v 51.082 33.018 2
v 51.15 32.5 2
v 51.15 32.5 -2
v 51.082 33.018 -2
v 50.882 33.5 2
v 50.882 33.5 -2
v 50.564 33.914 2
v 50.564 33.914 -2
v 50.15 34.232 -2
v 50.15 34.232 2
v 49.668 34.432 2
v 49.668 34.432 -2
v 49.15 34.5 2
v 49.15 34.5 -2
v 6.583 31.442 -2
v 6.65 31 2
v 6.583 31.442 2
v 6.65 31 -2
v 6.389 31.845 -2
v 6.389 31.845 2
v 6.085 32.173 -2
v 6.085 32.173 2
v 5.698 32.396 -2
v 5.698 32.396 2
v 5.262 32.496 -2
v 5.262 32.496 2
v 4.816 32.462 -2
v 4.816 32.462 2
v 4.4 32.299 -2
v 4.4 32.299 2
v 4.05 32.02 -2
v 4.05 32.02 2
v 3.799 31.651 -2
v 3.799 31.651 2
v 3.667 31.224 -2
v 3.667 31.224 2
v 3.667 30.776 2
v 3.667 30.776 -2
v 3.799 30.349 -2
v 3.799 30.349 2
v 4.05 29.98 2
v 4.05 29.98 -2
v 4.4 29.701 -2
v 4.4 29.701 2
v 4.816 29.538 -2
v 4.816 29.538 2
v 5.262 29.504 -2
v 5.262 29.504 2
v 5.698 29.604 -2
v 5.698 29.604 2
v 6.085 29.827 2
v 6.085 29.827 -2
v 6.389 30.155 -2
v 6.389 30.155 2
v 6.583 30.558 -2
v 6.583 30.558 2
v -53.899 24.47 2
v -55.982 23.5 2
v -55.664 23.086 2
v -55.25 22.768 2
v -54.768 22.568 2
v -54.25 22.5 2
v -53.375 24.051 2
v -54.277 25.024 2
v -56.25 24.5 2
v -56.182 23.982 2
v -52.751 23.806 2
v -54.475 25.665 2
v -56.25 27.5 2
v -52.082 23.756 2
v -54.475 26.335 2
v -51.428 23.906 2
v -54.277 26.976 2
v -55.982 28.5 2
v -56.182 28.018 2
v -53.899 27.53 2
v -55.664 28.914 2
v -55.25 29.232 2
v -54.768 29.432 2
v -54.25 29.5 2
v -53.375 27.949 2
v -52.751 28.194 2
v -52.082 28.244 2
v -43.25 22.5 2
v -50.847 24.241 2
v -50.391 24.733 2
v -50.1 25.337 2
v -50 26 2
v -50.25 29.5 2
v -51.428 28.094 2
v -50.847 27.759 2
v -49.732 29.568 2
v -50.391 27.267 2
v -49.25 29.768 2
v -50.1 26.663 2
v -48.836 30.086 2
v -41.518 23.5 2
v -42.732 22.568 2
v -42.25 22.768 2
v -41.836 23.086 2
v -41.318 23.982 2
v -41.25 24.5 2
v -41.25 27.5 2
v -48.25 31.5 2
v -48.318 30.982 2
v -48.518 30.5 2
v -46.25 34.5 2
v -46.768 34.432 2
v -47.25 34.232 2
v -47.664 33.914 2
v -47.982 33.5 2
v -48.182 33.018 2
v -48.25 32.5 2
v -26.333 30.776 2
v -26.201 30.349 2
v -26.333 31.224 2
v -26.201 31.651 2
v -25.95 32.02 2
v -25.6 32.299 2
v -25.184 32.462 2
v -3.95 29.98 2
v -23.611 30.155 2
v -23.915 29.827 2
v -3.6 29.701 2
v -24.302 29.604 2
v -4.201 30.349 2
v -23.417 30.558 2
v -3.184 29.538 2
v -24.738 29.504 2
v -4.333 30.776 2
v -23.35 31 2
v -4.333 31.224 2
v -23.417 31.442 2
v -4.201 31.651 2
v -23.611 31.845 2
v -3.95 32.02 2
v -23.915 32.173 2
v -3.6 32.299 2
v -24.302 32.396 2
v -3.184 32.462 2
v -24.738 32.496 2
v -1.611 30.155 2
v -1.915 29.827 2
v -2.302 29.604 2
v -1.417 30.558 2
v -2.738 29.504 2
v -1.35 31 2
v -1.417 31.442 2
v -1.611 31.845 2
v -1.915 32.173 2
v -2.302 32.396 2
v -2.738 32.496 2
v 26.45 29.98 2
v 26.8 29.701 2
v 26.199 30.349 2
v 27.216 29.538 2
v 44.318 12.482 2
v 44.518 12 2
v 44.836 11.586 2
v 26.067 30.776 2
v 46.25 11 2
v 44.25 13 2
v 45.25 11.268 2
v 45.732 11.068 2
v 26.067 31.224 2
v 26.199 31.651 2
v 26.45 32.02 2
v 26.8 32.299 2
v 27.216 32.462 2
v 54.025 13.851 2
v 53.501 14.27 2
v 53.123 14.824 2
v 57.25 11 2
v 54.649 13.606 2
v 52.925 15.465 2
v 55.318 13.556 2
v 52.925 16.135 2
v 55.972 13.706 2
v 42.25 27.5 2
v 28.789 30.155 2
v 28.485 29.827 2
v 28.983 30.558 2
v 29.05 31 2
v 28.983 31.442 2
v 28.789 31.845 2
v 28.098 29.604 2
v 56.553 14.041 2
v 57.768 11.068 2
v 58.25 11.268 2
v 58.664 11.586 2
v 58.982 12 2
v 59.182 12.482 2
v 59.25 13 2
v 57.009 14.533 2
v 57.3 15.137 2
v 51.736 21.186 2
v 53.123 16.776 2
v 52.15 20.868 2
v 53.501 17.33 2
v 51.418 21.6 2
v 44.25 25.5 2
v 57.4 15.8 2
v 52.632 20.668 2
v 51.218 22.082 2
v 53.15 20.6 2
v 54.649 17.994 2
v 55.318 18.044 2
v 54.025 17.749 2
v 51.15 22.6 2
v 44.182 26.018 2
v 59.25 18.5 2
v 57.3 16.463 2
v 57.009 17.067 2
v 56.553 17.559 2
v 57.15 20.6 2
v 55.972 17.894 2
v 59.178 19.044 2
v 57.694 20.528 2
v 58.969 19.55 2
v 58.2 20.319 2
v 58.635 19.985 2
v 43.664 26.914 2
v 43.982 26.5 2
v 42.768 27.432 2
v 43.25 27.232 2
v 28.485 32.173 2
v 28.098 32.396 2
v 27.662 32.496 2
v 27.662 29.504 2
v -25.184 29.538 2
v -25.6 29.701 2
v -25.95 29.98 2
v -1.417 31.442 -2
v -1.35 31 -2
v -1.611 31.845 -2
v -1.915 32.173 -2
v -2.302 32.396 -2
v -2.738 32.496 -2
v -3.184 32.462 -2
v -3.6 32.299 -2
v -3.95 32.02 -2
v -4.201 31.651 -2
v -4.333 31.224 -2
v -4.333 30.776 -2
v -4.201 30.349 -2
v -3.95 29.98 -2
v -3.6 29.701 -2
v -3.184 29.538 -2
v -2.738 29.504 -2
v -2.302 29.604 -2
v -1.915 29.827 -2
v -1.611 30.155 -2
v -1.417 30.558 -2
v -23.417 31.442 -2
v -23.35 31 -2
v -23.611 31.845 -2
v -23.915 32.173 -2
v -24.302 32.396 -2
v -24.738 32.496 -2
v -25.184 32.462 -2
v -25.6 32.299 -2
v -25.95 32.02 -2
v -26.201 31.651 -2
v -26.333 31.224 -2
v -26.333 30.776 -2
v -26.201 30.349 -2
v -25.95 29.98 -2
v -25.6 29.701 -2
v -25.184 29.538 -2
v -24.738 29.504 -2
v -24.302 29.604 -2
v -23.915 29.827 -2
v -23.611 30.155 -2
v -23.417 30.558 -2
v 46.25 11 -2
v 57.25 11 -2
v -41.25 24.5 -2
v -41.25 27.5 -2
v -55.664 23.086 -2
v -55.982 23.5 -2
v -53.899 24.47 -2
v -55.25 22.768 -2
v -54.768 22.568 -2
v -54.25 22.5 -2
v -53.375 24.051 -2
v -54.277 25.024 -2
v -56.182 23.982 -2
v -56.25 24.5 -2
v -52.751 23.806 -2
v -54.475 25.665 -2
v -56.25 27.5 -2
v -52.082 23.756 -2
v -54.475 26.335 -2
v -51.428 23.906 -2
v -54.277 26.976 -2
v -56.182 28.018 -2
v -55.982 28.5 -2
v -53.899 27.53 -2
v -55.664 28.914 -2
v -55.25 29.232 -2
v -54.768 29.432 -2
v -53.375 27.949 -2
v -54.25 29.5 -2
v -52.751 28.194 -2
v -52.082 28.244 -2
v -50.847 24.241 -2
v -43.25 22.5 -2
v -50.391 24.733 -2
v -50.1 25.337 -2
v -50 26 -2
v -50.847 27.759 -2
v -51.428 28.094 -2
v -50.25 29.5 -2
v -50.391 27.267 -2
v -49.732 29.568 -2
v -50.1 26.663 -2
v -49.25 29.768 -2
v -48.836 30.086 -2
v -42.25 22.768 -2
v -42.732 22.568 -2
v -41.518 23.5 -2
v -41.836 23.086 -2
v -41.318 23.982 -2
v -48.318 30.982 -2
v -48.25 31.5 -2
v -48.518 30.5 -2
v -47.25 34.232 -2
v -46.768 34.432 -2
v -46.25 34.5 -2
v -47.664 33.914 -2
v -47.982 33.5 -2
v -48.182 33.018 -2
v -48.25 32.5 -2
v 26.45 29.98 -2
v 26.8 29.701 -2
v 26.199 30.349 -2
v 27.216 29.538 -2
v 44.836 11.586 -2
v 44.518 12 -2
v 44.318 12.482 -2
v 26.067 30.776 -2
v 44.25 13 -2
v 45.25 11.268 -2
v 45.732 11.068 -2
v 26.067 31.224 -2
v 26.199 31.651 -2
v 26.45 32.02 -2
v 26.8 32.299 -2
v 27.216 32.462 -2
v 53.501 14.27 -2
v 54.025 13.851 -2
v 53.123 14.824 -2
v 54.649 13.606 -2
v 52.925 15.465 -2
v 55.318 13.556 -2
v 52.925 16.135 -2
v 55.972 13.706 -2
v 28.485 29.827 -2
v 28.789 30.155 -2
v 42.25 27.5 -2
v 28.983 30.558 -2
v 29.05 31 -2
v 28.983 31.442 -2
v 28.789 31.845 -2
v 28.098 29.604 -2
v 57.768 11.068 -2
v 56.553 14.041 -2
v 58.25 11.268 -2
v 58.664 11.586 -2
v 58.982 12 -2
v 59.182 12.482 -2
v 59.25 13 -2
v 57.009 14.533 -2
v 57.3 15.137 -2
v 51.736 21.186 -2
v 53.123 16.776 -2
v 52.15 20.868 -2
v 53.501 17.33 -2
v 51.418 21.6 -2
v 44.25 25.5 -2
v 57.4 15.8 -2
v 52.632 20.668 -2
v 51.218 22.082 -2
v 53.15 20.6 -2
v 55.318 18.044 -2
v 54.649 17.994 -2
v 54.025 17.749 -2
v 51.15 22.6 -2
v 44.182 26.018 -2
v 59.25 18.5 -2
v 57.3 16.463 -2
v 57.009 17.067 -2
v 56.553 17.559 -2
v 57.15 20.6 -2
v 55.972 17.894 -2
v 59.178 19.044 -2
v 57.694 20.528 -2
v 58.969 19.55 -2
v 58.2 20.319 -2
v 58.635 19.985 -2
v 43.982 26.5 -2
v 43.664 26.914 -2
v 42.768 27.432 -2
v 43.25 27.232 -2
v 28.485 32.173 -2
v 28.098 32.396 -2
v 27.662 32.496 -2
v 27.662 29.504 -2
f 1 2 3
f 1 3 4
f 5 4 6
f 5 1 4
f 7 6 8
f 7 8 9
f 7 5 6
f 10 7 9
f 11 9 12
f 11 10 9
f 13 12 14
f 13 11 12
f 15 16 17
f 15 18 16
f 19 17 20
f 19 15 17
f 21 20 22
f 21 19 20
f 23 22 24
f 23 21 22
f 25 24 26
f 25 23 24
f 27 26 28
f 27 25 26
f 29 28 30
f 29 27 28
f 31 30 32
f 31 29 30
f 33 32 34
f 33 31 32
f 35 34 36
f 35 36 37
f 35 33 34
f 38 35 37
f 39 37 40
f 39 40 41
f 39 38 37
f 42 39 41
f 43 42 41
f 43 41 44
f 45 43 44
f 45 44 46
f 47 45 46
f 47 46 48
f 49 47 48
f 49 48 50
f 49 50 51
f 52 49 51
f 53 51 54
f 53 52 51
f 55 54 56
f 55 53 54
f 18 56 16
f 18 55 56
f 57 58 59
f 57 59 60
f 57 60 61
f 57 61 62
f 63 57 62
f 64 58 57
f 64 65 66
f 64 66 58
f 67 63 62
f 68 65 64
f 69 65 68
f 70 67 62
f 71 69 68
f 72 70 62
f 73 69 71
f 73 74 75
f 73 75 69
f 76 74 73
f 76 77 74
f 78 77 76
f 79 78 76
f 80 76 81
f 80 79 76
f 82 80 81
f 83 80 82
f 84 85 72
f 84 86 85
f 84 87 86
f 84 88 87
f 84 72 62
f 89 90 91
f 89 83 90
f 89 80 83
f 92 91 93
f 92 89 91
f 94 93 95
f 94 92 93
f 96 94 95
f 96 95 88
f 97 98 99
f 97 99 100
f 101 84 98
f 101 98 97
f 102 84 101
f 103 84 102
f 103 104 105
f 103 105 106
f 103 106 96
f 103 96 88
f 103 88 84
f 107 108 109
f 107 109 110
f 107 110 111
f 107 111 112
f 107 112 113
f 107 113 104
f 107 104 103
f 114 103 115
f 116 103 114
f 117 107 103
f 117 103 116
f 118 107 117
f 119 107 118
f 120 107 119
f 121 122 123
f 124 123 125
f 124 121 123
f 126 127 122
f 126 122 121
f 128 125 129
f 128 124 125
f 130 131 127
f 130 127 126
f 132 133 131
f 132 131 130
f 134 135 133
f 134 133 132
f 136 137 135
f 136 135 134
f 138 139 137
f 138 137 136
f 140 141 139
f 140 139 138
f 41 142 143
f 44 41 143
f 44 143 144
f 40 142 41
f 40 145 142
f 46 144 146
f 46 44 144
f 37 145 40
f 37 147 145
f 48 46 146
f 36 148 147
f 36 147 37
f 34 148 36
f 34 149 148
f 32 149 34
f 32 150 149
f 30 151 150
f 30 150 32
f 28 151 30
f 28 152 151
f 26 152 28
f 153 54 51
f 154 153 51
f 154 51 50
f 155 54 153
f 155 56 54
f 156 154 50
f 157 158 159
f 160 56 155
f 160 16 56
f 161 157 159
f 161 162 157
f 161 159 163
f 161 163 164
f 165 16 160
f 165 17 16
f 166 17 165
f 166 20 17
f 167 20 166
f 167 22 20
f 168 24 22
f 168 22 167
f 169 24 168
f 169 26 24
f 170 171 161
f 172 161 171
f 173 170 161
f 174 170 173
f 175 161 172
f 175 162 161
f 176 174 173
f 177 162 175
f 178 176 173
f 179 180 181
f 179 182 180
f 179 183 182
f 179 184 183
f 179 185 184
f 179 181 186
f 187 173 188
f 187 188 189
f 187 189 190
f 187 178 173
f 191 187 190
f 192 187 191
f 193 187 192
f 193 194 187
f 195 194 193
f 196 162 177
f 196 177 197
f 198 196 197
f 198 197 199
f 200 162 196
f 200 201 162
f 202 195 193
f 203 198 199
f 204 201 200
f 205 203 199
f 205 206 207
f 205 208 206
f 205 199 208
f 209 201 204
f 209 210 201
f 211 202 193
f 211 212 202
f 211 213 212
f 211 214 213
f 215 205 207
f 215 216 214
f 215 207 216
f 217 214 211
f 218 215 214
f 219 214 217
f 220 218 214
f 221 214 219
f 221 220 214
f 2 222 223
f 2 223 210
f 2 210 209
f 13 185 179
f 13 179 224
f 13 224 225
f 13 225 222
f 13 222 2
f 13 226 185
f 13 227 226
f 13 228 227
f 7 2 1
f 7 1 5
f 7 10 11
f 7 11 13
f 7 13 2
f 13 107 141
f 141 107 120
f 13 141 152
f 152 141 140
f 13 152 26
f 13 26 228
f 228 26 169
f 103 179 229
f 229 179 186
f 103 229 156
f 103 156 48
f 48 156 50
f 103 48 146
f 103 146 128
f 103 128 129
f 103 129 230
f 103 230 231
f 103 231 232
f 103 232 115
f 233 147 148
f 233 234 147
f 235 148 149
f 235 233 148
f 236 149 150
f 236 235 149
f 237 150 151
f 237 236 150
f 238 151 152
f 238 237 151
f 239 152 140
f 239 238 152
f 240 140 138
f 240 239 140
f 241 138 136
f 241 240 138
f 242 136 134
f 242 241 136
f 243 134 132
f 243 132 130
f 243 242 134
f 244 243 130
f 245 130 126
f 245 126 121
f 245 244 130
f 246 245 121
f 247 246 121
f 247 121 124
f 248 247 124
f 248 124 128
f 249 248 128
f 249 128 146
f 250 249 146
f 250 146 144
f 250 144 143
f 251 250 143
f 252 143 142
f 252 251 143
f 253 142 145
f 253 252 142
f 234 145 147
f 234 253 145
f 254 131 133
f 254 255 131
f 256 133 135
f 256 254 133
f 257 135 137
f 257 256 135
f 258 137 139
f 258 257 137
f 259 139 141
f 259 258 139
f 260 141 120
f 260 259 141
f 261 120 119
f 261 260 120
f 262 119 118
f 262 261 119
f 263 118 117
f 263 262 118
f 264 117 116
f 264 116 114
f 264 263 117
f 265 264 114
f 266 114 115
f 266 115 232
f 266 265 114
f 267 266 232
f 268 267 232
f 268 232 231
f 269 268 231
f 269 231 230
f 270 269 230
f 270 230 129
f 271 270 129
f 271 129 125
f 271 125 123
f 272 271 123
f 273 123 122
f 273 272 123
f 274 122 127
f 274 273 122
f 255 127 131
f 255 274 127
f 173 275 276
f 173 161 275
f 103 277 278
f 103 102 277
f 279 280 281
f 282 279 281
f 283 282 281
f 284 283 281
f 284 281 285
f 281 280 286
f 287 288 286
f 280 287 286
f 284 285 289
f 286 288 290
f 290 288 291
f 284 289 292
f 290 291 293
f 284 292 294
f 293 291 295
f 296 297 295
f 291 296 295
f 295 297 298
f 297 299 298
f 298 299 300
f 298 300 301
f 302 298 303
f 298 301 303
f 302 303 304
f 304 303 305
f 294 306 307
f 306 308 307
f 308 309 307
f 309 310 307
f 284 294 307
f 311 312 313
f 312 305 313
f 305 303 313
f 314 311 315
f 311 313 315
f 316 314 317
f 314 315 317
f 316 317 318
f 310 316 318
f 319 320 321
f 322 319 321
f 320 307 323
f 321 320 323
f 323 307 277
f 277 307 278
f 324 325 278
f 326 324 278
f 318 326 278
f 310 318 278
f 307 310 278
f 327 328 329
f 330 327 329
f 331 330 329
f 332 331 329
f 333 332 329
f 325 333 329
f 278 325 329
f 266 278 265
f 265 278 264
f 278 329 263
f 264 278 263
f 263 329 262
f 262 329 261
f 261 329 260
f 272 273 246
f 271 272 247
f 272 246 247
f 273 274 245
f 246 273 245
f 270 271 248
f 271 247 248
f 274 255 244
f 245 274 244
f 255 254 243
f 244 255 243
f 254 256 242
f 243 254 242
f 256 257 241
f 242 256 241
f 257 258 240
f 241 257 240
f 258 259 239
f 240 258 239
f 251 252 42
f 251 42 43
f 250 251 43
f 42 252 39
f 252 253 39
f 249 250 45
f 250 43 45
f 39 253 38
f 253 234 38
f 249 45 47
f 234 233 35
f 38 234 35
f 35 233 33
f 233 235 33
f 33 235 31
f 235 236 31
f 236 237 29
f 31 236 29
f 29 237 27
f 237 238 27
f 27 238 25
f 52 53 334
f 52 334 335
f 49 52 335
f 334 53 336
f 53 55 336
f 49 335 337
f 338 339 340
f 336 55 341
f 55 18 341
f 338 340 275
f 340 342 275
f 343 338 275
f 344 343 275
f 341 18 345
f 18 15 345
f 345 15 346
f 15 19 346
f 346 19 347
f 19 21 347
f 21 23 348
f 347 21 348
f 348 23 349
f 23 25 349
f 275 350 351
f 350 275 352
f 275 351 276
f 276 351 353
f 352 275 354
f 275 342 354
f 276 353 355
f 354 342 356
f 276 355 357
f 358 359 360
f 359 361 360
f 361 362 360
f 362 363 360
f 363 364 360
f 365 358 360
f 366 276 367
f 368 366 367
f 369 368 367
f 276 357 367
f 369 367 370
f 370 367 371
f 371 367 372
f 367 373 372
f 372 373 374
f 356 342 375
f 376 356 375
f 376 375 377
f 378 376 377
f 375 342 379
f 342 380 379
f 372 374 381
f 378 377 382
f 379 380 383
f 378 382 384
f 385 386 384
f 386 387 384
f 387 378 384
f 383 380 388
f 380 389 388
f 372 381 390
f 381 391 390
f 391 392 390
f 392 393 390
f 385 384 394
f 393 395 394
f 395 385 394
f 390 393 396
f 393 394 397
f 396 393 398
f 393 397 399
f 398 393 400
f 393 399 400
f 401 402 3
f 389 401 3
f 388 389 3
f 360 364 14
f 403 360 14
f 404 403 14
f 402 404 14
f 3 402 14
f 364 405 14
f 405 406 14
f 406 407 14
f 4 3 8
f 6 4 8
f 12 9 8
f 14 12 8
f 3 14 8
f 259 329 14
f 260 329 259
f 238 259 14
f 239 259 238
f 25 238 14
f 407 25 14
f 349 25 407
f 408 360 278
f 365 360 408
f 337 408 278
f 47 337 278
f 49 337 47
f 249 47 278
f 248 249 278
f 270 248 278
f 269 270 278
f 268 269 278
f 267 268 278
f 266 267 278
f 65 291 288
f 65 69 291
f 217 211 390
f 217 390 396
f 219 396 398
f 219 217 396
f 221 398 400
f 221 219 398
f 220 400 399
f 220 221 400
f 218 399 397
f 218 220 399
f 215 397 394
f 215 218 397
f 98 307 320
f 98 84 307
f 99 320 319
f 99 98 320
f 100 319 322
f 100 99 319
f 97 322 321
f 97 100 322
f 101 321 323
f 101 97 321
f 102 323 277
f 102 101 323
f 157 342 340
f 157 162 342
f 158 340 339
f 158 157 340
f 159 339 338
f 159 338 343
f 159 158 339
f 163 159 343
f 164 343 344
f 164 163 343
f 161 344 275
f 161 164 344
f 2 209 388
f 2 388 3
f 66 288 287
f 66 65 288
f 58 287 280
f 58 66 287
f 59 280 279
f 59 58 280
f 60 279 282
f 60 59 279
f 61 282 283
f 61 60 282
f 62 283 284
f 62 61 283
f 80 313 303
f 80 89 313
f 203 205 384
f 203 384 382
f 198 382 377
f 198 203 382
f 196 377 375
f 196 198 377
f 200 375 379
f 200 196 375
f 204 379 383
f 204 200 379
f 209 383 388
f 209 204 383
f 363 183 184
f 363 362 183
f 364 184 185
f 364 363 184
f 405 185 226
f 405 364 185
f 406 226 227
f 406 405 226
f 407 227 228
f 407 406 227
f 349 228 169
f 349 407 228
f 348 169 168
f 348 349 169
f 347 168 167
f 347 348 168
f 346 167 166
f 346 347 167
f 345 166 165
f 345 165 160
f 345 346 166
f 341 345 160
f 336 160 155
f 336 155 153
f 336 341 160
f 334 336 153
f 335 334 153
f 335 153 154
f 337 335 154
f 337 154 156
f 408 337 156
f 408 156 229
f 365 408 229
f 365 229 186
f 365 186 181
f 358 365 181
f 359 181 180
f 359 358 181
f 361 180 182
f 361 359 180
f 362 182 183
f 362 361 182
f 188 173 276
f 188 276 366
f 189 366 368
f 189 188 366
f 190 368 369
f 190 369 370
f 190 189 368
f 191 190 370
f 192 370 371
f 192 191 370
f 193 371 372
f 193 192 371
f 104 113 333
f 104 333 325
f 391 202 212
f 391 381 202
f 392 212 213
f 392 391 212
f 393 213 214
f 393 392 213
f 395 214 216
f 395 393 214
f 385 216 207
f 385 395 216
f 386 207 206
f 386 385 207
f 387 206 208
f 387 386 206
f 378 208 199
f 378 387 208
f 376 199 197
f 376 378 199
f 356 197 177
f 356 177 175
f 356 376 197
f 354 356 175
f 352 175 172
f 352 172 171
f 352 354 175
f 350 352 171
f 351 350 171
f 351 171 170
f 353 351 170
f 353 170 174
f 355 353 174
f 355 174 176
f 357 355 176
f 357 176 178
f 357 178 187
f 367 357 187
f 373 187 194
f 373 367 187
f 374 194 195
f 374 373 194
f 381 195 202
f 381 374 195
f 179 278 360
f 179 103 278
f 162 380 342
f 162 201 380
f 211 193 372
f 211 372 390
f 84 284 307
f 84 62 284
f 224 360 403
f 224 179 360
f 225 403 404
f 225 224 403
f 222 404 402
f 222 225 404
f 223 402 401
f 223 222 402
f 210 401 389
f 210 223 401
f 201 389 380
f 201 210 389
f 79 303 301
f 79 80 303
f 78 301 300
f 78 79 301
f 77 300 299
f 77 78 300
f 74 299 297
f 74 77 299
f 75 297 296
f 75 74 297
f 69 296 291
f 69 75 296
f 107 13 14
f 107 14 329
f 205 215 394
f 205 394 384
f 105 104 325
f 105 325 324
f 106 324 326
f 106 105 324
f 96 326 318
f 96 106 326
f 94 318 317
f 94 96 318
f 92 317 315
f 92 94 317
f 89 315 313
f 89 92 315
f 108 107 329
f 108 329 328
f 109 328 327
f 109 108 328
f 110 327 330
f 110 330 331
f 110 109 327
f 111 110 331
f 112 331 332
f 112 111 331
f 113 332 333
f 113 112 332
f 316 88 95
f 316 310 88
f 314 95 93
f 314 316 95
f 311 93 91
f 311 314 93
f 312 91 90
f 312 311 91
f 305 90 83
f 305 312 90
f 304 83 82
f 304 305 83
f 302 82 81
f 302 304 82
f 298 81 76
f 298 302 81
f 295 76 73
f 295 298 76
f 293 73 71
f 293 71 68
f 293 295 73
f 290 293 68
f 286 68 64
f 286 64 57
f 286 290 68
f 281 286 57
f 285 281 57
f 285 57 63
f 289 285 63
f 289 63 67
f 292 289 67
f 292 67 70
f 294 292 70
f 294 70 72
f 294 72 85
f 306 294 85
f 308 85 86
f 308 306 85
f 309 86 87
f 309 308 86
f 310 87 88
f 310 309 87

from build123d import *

# Parameters (mm, degrees)
F0_R     = 2.25
F0_R_2   = 1.5
F1_DEPTH = 2


with BuildPart() as f1:
    # F0 (on Top) → F1 (new body, symmetric)
    with BuildSketch(Plane.XY):
        with BuildLine():
            Line((46.25, 11), (57.25, 11))
            ThreePointArc((57.25, 11), (58.664214, 11.585786), (59.25, 13))
            Line((59.25, 13), (59.25, 18.5))
            ThreePointArc((59.25, 18.5), (58.634924, 19.984924), (57.15, 20.6))
            Line((57.15, 20.6), (53.15, 20.6))
            ThreePointArc((53.15, 20.6), (51.735786, 21.185786), (51.15, 22.6))
            Line((51.15, 22.6), (51.15, 32.5))
            ThreePointArc((51.15, 32.5), (50.564214, 33.914214), (49.15, 34.5))
            Line((49.15, 34.5), (-46.25, 34.5))
            ThreePointArc((-46.25, 34.5), (-47.664214, 33.914214), (-48.25, 32.5))
            Line((-48.25, 32.5), (-48.25, 31.5))
            ThreePointArc((-48.25, 31.5), (-48.835786, 30.085786), (-50.25, 29.5))
            Line((-50.25, 29.5), (-54.25, 29.5))
            ThreePointArc((-54.25, 29.5), (-55.664214, 28.914214), (-56.25, 27.5))
            Line((-56.25, 27.5), (-56.25, 24.5))
            ThreePointArc((-56.25, 24.5), (-55.664214, 23.085786), (-54.25, 22.5))
            Line((-54.25, 22.5), (-43.25, 22.5))
            ThreePointArc((-43.25, 22.5), (-41.835786, 23.085786), (-41.25, 24.5))
            Line((-41.25, 24.5), (-41.25, 27.5))
            Line((-41.25, 27.5), (42.25, 27.5))
            ThreePointArc((42.25, 27.5), (43.664214, 26.914214), (44.25, 25.5))
            Line((44.25, 25.5), (44.25, 13))
            ThreePointArc((44.25, 13), (44.835786, 11.585786), (46.25, 11))
        make_face()
        with Locations((55.15, 15.8)):
            Circle(F0_R, mode=Mode.SUBTRACT)
        with Locations((-52.25, 26)):
            Circle(F0_R, mode=Mode.SUBTRACT)
        with Locations((-24.85, 31)):
            Circle(F0_R_2, mode=Mode.SUBTRACT)
        with Locations((-2.85, 31)):
            Circle(F0_R_2, mode=Mode.SUBTRACT)
        with Locations((5.15, 31)):
            Circle(F0_R_2, mode=Mode.SUBTRACT)
        with Locations((27.55, 31)):
            Circle(F0_R_2, mode=Mode.SUBTRACT)
    extrude(amount=F1_DEPTH, both=True)


solid = f1.part
